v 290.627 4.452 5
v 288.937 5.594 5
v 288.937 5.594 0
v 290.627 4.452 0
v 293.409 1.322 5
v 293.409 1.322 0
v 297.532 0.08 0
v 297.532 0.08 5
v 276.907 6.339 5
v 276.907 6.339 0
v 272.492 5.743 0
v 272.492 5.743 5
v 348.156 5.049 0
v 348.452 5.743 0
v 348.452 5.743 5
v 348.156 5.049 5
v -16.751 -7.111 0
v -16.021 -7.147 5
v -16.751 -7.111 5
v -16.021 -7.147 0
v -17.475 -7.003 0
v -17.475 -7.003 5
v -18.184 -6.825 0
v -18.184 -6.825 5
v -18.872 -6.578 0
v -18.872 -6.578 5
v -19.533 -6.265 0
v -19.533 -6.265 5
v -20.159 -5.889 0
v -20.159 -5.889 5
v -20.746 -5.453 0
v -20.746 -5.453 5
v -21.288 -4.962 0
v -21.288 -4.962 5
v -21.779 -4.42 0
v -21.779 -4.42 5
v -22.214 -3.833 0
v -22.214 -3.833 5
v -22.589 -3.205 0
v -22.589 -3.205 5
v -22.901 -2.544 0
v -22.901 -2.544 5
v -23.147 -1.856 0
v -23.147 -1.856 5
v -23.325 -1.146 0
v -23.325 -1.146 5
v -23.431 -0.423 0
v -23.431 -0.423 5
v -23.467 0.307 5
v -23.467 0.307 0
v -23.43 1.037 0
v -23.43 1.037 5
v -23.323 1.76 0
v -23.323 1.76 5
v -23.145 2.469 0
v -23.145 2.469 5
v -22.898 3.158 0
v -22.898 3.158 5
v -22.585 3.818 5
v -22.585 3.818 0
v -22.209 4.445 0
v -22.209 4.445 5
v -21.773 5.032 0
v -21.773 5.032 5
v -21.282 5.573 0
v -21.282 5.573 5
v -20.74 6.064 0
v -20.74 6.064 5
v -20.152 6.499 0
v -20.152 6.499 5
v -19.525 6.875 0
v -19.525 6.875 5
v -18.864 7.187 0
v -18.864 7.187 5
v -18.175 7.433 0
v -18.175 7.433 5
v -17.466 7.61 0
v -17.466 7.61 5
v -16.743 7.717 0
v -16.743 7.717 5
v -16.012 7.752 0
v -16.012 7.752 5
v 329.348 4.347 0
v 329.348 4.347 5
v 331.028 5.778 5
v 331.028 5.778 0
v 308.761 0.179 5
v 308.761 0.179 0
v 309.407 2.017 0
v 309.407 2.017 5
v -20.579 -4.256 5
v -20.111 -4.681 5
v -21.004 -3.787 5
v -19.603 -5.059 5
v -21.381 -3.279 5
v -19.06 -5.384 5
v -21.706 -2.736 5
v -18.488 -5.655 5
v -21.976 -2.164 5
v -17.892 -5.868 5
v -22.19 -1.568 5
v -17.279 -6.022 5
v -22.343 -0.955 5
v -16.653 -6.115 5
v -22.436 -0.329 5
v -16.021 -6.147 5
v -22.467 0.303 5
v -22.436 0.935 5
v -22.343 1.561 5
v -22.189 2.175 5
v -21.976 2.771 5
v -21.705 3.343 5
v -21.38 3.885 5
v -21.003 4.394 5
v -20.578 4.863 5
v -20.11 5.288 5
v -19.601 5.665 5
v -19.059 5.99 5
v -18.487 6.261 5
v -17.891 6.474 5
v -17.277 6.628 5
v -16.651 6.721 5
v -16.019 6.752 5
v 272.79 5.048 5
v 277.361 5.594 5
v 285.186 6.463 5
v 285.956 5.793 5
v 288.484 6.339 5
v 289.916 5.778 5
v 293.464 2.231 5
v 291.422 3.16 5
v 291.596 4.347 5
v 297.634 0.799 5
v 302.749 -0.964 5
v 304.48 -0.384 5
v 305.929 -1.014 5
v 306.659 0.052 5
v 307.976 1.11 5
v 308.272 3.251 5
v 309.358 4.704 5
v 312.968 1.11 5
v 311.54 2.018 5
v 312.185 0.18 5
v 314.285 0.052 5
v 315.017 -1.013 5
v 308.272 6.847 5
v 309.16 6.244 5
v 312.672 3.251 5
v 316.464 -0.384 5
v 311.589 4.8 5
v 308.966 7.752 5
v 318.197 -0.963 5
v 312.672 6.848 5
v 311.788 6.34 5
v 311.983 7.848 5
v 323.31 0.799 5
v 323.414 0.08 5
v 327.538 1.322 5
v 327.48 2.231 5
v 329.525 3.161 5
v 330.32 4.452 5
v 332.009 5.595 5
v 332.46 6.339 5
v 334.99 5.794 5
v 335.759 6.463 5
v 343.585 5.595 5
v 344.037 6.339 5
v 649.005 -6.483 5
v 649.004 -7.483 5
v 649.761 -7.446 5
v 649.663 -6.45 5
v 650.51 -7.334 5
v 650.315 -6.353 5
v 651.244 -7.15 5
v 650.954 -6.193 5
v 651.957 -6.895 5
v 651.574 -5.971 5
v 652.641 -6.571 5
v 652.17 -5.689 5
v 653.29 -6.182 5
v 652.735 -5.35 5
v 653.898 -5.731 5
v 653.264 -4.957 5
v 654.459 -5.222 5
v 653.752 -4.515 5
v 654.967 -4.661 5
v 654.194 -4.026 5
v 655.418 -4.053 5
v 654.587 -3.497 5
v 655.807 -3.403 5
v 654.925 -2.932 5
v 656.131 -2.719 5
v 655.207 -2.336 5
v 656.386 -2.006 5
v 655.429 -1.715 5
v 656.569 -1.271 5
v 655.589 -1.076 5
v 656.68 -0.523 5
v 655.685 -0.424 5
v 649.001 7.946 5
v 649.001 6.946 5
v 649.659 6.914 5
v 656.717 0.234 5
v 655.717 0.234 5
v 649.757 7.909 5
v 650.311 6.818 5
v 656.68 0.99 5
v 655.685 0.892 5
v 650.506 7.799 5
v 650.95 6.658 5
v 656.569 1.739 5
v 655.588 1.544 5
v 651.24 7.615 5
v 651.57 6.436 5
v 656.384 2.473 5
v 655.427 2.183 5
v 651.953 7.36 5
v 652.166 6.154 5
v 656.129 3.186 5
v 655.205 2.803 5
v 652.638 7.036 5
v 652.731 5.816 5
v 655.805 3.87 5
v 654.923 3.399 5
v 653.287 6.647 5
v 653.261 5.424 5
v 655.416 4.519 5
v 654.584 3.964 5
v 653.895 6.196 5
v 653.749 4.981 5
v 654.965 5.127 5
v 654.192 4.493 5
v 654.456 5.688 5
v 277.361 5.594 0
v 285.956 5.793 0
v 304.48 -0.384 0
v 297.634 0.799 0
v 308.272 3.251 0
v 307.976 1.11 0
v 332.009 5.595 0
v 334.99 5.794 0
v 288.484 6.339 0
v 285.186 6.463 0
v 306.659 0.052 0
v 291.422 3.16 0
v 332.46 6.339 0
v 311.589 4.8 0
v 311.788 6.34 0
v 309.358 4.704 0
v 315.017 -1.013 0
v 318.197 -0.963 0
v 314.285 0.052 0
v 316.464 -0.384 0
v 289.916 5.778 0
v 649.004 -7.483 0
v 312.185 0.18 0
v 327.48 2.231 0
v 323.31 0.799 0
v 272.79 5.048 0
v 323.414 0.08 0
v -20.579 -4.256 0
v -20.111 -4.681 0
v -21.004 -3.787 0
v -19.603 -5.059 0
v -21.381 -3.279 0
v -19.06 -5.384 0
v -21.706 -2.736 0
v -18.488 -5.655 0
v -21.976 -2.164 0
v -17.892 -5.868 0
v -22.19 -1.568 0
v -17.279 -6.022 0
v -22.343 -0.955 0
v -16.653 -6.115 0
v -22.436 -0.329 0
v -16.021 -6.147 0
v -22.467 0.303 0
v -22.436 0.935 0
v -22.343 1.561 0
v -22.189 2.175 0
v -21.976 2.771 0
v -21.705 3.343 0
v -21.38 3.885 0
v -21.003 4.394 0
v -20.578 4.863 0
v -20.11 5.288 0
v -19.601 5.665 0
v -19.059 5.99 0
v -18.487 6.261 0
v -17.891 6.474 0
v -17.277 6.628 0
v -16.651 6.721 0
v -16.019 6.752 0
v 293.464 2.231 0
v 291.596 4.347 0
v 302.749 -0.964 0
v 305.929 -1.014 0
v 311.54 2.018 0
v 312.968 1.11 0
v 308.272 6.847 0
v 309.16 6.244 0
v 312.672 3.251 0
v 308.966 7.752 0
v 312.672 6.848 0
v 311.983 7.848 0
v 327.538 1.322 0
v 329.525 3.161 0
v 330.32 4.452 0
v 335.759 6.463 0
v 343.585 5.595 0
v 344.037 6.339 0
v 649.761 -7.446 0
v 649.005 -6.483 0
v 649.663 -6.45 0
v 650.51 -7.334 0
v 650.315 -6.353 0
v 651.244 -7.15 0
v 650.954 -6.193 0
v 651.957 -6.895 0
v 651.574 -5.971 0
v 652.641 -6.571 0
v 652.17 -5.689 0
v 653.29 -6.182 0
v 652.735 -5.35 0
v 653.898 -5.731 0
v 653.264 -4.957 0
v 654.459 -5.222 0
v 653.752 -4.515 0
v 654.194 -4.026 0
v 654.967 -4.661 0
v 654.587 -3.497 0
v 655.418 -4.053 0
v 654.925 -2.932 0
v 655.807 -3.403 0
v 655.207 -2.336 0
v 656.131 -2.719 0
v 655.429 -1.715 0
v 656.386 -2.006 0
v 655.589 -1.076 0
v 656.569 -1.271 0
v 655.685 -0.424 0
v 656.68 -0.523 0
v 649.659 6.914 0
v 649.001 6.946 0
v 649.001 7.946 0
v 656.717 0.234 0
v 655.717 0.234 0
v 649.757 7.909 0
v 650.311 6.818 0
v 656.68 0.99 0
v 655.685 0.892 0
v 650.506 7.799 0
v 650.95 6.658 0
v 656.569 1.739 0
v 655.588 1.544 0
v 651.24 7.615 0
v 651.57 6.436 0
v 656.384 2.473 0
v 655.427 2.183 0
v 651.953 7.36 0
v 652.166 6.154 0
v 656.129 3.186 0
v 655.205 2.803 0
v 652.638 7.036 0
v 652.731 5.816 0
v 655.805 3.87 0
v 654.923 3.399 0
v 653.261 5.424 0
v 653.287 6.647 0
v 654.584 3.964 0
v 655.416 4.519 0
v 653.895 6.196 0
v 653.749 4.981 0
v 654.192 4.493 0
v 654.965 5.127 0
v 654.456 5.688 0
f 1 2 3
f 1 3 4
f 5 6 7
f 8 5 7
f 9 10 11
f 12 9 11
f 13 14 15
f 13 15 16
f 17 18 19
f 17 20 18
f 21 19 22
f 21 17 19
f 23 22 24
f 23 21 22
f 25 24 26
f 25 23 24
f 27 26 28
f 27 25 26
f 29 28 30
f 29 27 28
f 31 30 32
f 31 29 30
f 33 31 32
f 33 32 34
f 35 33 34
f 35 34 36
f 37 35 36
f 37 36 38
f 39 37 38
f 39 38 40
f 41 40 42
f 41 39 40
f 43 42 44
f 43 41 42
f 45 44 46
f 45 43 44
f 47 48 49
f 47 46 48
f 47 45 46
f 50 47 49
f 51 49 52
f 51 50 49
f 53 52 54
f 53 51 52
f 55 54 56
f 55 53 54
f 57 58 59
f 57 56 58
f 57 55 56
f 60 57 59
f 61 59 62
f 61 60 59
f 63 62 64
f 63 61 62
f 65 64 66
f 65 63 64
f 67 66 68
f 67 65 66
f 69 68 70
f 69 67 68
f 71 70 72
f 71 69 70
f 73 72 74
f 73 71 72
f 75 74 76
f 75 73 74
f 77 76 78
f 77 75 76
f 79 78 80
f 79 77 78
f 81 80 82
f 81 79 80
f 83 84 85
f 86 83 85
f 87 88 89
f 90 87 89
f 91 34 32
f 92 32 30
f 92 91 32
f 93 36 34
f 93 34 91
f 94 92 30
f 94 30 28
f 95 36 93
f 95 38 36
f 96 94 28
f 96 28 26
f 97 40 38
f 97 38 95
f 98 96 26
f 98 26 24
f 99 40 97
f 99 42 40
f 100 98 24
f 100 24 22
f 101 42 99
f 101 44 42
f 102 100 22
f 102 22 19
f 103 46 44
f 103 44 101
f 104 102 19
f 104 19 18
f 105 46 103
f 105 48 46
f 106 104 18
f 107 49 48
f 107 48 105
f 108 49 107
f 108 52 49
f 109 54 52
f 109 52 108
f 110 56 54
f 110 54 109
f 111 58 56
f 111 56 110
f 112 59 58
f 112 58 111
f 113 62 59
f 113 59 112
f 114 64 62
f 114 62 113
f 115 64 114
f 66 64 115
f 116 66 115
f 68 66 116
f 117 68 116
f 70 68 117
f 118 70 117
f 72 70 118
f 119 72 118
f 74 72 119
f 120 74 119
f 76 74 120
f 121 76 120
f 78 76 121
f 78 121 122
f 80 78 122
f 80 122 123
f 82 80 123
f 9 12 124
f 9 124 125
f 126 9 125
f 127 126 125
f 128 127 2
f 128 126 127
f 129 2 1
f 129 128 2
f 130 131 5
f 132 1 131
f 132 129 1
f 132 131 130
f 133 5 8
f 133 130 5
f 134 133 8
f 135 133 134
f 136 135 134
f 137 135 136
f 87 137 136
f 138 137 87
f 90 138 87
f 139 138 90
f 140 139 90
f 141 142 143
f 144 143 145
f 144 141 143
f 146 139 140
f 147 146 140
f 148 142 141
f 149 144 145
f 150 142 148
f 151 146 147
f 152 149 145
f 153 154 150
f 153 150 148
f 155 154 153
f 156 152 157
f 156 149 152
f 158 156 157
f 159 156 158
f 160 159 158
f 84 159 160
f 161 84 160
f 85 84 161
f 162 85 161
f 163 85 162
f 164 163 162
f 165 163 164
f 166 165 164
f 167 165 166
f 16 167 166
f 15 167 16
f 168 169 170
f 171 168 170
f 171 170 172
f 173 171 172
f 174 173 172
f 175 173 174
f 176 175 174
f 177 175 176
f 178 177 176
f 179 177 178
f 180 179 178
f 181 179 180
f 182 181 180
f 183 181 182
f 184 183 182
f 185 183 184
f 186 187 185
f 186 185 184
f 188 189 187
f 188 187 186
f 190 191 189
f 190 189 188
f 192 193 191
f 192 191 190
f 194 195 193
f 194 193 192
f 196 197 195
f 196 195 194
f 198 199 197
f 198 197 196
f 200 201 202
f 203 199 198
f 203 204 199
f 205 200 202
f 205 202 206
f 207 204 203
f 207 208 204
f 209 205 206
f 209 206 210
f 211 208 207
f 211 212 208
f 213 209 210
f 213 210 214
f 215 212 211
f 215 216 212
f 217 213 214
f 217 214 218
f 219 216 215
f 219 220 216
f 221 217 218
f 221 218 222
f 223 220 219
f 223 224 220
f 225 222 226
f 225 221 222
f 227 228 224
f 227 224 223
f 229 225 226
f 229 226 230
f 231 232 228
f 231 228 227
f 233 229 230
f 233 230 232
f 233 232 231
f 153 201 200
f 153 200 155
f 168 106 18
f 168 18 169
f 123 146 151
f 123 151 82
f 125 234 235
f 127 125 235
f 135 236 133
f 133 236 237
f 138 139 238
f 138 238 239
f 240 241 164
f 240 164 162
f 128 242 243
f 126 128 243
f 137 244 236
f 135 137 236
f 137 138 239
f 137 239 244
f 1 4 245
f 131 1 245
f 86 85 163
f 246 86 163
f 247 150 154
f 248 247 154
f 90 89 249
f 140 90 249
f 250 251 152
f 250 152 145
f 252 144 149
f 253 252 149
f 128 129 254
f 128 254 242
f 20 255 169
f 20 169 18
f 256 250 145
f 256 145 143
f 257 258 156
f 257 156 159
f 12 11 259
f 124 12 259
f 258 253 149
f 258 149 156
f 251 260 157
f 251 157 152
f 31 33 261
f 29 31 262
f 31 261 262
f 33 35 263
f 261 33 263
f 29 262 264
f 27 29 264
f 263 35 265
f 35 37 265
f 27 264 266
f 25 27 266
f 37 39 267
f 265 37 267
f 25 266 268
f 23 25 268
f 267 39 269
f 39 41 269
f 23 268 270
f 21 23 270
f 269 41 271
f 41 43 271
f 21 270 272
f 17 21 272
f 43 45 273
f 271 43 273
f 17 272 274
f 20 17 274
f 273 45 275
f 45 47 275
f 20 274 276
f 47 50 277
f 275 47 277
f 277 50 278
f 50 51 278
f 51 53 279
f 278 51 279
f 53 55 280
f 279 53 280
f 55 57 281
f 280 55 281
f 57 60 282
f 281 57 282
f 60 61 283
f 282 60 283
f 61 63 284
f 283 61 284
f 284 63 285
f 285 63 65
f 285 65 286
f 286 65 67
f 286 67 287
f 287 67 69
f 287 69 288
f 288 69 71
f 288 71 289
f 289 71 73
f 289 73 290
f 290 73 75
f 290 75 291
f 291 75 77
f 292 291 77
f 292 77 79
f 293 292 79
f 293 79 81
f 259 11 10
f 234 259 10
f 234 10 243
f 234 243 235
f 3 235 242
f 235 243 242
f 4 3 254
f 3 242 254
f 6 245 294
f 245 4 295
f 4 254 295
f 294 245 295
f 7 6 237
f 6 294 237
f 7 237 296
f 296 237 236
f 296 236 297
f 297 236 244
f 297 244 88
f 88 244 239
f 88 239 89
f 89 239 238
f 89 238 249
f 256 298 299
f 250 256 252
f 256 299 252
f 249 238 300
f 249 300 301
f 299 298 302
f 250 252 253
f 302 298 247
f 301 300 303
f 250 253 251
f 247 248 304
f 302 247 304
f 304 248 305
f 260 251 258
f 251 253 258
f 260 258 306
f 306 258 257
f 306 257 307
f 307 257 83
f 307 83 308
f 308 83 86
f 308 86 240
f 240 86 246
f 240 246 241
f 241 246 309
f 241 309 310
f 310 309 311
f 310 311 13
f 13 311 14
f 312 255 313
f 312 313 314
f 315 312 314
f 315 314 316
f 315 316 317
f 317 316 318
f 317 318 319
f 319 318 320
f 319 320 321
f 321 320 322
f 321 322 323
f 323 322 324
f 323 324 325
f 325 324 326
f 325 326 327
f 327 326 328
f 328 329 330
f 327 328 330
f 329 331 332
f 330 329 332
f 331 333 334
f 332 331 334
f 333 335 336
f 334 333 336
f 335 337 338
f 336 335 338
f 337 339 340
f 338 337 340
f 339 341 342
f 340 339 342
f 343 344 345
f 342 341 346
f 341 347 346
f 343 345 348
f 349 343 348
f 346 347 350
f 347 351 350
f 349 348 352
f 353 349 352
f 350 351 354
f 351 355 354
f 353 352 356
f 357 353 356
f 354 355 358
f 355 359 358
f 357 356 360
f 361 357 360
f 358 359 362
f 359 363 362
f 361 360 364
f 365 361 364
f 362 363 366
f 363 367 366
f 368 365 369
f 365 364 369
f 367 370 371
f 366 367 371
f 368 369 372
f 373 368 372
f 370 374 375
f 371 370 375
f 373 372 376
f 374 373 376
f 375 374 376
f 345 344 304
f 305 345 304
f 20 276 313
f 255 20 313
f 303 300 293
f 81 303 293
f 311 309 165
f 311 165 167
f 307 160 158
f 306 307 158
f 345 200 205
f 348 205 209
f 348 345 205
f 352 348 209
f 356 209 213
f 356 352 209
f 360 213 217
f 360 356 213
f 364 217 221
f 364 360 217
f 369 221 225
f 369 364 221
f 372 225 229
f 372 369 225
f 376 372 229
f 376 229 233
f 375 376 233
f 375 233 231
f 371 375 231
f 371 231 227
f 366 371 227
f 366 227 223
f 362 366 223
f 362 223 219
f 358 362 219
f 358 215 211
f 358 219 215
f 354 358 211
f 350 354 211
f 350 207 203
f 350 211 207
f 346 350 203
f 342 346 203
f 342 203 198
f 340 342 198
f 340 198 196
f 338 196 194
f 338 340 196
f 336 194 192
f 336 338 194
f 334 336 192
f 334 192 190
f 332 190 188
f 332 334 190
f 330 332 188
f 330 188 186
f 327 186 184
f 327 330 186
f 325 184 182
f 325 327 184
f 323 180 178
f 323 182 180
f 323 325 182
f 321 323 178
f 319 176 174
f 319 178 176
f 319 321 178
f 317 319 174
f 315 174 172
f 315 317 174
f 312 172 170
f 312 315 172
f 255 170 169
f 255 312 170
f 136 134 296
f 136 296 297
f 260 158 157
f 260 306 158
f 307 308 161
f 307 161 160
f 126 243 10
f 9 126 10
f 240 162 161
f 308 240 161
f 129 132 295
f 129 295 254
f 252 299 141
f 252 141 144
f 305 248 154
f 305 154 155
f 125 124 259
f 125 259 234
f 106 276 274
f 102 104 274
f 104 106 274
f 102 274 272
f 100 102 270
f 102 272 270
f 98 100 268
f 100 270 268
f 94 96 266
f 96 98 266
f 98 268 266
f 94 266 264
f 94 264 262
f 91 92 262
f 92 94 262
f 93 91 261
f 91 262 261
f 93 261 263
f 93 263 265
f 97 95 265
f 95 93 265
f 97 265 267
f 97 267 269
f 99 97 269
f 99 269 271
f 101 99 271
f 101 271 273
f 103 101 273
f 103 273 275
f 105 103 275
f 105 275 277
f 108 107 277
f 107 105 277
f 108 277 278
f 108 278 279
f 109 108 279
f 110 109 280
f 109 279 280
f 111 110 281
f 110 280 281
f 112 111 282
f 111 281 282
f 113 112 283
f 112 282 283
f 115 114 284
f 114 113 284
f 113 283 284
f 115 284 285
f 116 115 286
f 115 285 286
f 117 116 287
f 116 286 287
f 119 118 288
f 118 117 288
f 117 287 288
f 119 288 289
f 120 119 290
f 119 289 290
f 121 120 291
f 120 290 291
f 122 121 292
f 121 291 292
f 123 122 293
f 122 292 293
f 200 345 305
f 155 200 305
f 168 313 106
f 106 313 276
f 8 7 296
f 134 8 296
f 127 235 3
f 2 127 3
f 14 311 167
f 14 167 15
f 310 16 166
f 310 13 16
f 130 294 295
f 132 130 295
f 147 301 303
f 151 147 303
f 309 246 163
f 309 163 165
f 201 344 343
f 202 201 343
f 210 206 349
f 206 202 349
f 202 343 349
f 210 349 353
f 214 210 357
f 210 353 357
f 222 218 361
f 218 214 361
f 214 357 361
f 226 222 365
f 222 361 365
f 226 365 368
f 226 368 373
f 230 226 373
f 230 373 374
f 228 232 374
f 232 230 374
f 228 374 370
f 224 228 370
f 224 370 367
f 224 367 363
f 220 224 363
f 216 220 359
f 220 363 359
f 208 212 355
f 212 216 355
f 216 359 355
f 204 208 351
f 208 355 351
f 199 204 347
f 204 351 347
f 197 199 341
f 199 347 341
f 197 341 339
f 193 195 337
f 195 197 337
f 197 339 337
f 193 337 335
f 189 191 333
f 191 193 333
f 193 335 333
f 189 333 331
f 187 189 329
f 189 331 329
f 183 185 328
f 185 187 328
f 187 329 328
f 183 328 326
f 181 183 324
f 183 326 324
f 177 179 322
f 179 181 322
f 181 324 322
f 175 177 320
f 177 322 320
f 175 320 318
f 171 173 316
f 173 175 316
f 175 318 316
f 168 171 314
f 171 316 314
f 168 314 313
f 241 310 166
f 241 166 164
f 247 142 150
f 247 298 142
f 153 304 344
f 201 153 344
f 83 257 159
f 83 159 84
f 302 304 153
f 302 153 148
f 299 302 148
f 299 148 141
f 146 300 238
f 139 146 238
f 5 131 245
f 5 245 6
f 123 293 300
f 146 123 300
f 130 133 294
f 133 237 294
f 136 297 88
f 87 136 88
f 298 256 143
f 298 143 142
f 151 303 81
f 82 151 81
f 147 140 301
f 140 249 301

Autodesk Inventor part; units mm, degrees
ref_plane "YZ Plane" through (0, 0, 0) normal (1, 0, 0) x (0, 1, 0)
ref_plane "XZ Plane" through (0, 0, 0) normal (0, 1, 0) x (-1, 0, 0)
ref_plane "XY Plane" through (0, 0, 0) normal (0, 0, 1) x (1, 0, 0)
sketch "Sketch1" plane through (0, 0, 0) normal (0, 0, 1) x (1, 0, 0)
  arc A0 (-16.0194, 6.752) -> (-16.0208, -6.1468) centre (-16.0175, 0.3026) ccw
  arc A1 (649.005, -6.4829) -> (649.0007, 6.9464) centre (649.0026, 0.2317) ccw
  line L0 (649.005, -6.4829) -> (-16.0208, -6.1468)
  arc A2 (649.0045, -7.4829) -> (649.0008, 7.9464) centre (649.0026, 0.2317) ccw
  line L1 (649.0008, 7.9464) -> (311.9827, 7.8478)
  line L2 (649.0045, -7.4829) -> (-16.0213, -7.1468)
  arc A3 (-16.0124, 7.7519) -> (-16.0213, -7.1468) centre (-16.0175, 0.3026) ccw
  line L3 (312.9758, 5.1048) -> (312.9758, 3.1737)
  line L4 (312.9758, 3.1737) -> (313.0166, 2.6809)
  line L5 (313.0166, 2.6809) -> (313.1377, 2.2016)
  line L6 (313.1377, 2.2016) -> (313.3359, 1.7486)
  line L7 (313.3359, 1.7486) -> (313.6059, 1.3343)
  line L8 (313.6059, 1.3343) -> (313.9402, 0.97)
  line L9 (313.9402, 0.97) -> (314.3298, 0.6656)
  line L10 (314.3298, 0.6656) -> (314.7641, 0.4293)
  line L11 (314.7641, 0.4293) -> (315.2314, 0.2675)
  line L12 (315.2314, 0.2675) -> (315.7189, 0.1847)
  line L13 (315.7189, 0.1847) -> (316.2133, 0.1831)
  line L14 (316.2133, 0.1831) -> (318.2319, 0.3939)
  line L15 (318.2319, 0.3939) -> (320.8327, 0.8165)
  line L16 (320.8327, 0.8165) -> (323.4008, 1.4058)
  line L17 (323.4008, 1.4058) -> (325.9257, 2.1591)
  line L18 (325.9257, 2.1591) -> (326.3565, 2.3413)
  line L19 (326.3565, 2.3413) -> (326.7537, 2.5883)
  line L20 (326.7537, 2.5883) -> (327.1077, 2.8941)
  line L21 (327.1077, 2.8941) -> (327.4099, 3.2511)
  line L22 (327.4099, 3.2511) -> (327.6529, 3.6508)
  line L23 (327.6529, 3.6508) -> (327.8308, 4.0834)
  line L24 (327.8308, 4.0834) -> (327.9394, 4.5384)
  line L25 (327.9394, 4.5384) -> (327.9758, 5.0047)
  line L26 (327.9758, 5.1048) -> (327.9758, 5.0047)
  line L27 (312.9758, 5.1048) -> (327.9758, 5.1048)
  line L28 (308.2722, 6.8467) -> (308.2722, 3.2511)
  line L29 (308.2722, 3.2511) -> (307.9758, 1.1103)
  line L30 (307.9758, 1.1103) -> (306.659, 0.0522)
  line L31 (306.659, 0.0522) -> (304.4805, -0.3835)
  line L32 (304.4805, -0.3835) -> (297.6339, 0.7991)
  line L33 (297.6339, 0.7991) -> (293.4637, 2.2307)
  line L34 (293.4637, 2.2307) -> (291.5964, 4.3469)
  line L35 (291.5964, 4.3469) -> (289.9159, 5.7785)
  line L36 (289.9159, 5.7785) -> (288.4843, 6.3387)
  line L37 (288.4843, 6.3387) -> (285.1855, 6.4631)
  line L38 (285.1855, 6.4631) -> (276.9073, 6.3387)
  line L39 (276.9073, 6.3387) -> (272.4922, 5.7434)
  line L40 (272.4922, 5.7434) -> (272.7903, 5.0479)
  line L41 (272.7903, 5.0479) -> (277.3612, 5.5944)
  line L42 (277.3612, 5.5944) -> (285.9563, 5.7931)
  line L43 (285.9563, 5.7931) -> (288.9373, 5.5944)
  line L44 (288.9373, 5.5944) -> (290.6266, 4.4517)
  line L45 (290.6266, 4.4517) -> (291.4215, 3.1599)
  line L46 (291.4215, 3.1599) -> (293.4088, 1.3216)
  line L47 (293.4088, 1.3216) -> (297.5325, 0.0795)
  line L48 (297.5325, 0.0795) -> (302.7492, -0.9638)
  line L49 (302.7492, -0.9638) -> (305.929, -1.0135)
  line L50 (305.929, -1.0135) -> (308.7609, 0.1789)
  line L51 (308.7609, 0.1789) -> (309.4068, 2.0172)
  line L52 (309.4068, 2.0172) -> (309.3584, 4.7043)
  line L53 (309.3584, 4.7043) -> (309.1601, 6.2436)
  line L54 (309.1601, 6.2436) -> (308.9658, 7.7519)
  line L55 (312.672, 6.848) -> (312.672, 3.2511)
  line L56 (312.672, 3.2511) -> (312.9684, 1.1103)
  line L57 (312.9684, 1.1103) -> (314.2852, 0.0522)
  line L58 (314.2852, 0.0522) -> (316.4637, -0.3835)
  line L59 (316.4637, -0.3835) -> (323.3103, 0.7991)
  line L60 (323.3103, 0.7991) -> (327.4805, 2.2307)
  line L61 (327.4805, 2.2307) -> (329.3478, 4.3469)
  line L62 (329.3478, 4.3469) -> (331.0283, 5.7785)
  line L63 (331.0283, 5.7785) -> (332.4599, 6.3387)
  line L64 (332.4599, 6.3387) -> (335.7587, 6.4631)
  line L65 (335.7587, 6.4631) -> (344.0369, 6.3387)
  line L66 (344.0369, 6.3387) -> (348.452, 5.7434)
  line L67 (348.452, 5.7434) -> (348.156, 5.0487)
  line L68 (348.156, 5.0487) -> (343.5851, 5.5953)
  line L69 (343.5851, 5.5953) -> (334.9899, 5.794)
  line L70 (334.9899, 5.794) -> (332.009, 5.5953)
  line L71 (332.009, 5.5953) -> (330.3197, 4.4525)
  line L72 (330.3197, 4.4525) -> (329.5248, 3.1608)
  line L73 (329.5248, 3.1608) -> (327.5375, 1.3225)
  line L74 (327.5375, 1.3225) -> (323.4138, 0.0804)
  line L75 (323.4138, 0.0804) -> (318.197, -0.9629)
  line L76 (318.197, -0.9629) -> (315.0173, -1.0126)
  line L77 (315.0173, -1.0126) -> (312.1854, 0.1798)
  line L78 (312.1854, 0.1798) -> (311.5395, 2.0181)
  line L79 (311.5395, 2.0181) -> (311.5892, 4.8003)
  line L80 (311.5892, 4.8003) -> (311.7879, 6.3395)
  line L81 (311.5892, 4.8003) -> (311.9827, 7.8478)
  line L82 (-16.0194, 6.752) -> (308.2722, 6.8467)
  line L83 (312.672, 6.848) -> (649.0007, 6.9464)
  line L84 (308.9658, 7.7519) -> (-16.0124, 7.7519)
  point P0 (0, 0)
  dimension "d1" = 1
extrude "Extrusion1" add sketch "Sketch1" along normal blind 5 contours A0 L0 A1 L83 L55 L56 L57 L58 L59 L60 L61 L62 L63 L64 L65 L66 L67 L68 L69 L70 L71 L72 L73 L74 L75 L76 L77 L78 L79 L80 L81 L1 A2 L2 A3 L84 L54 L53 L52 L51 L50 L49 L48 L47 L46 L45 L44 L43 L42 L41 L40 L39 L38 L37 L36 L35 L34 L33 L32 L31 L30 L29 L28 L82
properties part number "YBELT"
